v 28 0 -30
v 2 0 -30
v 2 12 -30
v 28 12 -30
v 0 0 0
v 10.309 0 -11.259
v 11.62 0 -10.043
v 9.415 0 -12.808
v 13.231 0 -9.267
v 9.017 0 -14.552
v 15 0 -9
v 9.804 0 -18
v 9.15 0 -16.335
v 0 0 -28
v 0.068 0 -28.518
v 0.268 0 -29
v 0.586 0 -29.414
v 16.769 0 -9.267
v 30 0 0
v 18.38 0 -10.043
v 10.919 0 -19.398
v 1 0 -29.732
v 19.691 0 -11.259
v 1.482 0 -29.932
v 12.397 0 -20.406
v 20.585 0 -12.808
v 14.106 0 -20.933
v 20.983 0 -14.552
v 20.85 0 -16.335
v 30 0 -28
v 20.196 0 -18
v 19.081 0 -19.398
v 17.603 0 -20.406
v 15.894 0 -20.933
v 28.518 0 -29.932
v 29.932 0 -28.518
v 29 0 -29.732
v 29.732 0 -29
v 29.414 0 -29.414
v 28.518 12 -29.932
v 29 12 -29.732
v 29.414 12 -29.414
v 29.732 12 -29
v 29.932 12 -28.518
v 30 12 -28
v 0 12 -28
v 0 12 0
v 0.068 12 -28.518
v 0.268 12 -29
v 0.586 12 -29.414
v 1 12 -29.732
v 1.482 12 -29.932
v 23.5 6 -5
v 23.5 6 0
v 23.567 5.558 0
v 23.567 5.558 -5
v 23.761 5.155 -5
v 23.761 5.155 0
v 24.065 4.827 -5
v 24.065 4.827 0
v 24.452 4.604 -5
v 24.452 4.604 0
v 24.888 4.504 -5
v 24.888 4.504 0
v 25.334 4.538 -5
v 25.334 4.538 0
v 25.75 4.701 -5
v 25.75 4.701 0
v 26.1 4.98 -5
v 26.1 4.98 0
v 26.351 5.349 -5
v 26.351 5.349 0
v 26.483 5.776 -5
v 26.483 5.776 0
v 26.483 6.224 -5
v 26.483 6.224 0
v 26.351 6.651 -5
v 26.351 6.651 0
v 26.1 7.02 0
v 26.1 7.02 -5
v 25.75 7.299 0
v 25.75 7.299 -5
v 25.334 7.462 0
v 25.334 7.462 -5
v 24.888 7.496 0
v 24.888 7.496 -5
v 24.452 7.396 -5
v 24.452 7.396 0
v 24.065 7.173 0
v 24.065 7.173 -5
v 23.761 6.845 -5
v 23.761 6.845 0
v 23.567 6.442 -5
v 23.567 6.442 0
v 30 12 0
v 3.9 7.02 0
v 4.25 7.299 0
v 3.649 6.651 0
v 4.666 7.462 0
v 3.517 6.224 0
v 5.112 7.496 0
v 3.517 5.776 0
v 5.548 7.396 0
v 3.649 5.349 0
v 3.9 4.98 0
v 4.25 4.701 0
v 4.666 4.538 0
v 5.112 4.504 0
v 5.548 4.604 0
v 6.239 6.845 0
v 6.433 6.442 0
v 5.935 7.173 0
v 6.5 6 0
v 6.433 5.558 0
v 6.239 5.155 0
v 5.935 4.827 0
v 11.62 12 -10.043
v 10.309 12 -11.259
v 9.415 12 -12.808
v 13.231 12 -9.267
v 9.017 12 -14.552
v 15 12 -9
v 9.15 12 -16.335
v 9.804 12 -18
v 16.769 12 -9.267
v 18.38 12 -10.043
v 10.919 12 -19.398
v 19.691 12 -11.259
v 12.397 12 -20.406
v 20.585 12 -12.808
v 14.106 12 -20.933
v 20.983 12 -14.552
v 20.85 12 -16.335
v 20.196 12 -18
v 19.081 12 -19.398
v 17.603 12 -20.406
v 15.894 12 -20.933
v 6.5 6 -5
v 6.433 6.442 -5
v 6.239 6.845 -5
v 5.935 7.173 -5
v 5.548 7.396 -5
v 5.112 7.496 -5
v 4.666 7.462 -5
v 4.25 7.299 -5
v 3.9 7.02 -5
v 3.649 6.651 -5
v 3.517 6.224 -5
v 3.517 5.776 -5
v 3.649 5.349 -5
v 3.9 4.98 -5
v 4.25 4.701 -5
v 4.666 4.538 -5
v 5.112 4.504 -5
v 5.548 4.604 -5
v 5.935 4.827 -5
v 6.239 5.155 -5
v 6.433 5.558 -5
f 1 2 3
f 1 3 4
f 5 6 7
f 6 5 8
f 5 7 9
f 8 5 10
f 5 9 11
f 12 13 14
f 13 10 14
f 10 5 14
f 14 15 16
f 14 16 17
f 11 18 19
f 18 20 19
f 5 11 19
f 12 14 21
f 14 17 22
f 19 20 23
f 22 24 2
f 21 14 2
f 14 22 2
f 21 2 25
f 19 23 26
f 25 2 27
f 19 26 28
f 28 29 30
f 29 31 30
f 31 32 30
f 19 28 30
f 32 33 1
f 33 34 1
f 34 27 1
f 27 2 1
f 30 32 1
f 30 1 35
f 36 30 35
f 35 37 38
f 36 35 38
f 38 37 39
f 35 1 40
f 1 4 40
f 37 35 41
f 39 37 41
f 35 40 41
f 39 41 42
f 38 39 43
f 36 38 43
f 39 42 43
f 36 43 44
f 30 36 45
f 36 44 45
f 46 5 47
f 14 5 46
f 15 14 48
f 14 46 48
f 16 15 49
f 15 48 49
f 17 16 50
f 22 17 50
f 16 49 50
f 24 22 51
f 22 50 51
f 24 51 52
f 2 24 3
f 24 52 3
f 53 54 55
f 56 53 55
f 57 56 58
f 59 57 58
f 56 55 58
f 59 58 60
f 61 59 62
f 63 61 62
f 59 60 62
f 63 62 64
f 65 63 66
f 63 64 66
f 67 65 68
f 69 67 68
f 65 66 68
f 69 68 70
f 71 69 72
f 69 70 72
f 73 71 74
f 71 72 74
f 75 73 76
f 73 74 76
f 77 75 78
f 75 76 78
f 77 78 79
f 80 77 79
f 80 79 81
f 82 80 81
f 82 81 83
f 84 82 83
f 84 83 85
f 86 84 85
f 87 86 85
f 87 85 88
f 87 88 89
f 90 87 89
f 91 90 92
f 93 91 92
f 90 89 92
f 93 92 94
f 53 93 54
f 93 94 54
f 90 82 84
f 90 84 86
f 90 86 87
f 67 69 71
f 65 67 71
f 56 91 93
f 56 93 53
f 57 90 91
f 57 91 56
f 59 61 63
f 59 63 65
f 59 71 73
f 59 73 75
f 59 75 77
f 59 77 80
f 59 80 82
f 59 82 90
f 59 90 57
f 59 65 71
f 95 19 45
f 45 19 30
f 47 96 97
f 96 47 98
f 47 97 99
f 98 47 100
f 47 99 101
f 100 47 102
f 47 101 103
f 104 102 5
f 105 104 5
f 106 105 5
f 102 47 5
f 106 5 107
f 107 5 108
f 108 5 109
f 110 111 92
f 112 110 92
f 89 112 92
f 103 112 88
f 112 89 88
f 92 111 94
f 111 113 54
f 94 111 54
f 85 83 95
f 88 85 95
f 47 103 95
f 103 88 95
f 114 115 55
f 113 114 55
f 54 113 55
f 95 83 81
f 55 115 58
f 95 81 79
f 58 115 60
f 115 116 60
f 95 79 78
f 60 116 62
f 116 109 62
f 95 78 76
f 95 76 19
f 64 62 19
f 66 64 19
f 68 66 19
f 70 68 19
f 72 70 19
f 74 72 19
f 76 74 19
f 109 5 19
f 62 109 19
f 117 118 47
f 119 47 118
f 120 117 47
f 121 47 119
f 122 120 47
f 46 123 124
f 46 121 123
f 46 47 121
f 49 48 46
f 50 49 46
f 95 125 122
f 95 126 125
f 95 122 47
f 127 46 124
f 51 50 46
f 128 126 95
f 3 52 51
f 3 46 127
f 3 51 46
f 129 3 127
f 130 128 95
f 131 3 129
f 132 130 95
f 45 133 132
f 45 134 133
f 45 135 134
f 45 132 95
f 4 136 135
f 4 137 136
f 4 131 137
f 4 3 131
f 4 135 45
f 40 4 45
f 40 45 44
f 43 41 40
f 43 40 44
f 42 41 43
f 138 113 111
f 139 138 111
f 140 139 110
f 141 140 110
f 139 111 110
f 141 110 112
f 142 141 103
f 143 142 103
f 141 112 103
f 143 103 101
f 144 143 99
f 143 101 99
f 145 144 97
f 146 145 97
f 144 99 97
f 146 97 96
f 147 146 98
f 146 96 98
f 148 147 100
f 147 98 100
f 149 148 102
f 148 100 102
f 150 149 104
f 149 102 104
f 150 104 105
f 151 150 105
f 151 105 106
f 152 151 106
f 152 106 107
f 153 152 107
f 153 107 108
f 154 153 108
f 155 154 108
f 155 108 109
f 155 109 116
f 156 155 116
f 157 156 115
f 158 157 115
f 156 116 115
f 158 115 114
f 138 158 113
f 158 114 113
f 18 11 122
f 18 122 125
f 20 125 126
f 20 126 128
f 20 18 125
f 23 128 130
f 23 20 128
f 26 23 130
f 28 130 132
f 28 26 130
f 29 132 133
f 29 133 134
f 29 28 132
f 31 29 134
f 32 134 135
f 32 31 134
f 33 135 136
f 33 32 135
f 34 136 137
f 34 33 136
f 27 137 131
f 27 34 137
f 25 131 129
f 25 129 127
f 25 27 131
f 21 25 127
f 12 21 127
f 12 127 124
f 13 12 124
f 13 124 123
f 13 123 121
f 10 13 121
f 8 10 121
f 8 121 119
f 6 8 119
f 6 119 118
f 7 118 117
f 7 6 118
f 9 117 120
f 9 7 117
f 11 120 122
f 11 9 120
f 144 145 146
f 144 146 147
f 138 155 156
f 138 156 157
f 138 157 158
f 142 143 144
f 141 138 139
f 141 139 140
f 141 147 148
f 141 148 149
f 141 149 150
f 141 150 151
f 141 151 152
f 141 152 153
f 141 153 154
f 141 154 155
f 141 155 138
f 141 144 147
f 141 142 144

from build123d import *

# Parameters (mm, degrees)
SKETCH1_W           = 30
SKETCH1_H           = 30
SKETCH1_R           = 6
BOSS_EXTRUDE1_DEPTH = 12
FILLET1_R           = 2
SKETCH2_R           = 1.5
CUT_EXTRUDE1_DEPTH  = 5


with BuildPart() as part:
    # Sketch1 → Boss-Extrude1 (new body)
    with BuildSketch(Plane(origin=(0, 0, 0), x_dir=(1, 0, 0), z_dir=(0, 1, 0))):
        with Locations((15, 15)):
            Rectangle(SKETCH1_W, SKETCH1_H)
        with Locations(Location((15, 15, 0), (0, 0, 270))):
            Circle(SKETCH1_R, mode=Mode.SUBTRACT)
    extrude(amount=BOSS_EXTRUDE1_DEPTH)

    # Fillet1
    fillet1_edges = [part.edges().sort_by_distance(p)[0] for p in [
        (0, 6, -30),
        (30, 6, -30),
    ]]
    fillet(fillet1_edges, radius=FILLET1_R)

    # Sketch2 → Cut-Extrude1 (cut)
    with BuildSketch(Plane.XY):
        with Locations((5, 6)):
            Circle(SKETCH2_R)
        with Locations(Location((25, 6, 0), (0, 0, 180))):
            Circle(SKETCH2_R)
    extrude(amount=-CUT_EXTRUDE1_DEPTH, mode=Mode.SUBTRACT)


solid = part.part
